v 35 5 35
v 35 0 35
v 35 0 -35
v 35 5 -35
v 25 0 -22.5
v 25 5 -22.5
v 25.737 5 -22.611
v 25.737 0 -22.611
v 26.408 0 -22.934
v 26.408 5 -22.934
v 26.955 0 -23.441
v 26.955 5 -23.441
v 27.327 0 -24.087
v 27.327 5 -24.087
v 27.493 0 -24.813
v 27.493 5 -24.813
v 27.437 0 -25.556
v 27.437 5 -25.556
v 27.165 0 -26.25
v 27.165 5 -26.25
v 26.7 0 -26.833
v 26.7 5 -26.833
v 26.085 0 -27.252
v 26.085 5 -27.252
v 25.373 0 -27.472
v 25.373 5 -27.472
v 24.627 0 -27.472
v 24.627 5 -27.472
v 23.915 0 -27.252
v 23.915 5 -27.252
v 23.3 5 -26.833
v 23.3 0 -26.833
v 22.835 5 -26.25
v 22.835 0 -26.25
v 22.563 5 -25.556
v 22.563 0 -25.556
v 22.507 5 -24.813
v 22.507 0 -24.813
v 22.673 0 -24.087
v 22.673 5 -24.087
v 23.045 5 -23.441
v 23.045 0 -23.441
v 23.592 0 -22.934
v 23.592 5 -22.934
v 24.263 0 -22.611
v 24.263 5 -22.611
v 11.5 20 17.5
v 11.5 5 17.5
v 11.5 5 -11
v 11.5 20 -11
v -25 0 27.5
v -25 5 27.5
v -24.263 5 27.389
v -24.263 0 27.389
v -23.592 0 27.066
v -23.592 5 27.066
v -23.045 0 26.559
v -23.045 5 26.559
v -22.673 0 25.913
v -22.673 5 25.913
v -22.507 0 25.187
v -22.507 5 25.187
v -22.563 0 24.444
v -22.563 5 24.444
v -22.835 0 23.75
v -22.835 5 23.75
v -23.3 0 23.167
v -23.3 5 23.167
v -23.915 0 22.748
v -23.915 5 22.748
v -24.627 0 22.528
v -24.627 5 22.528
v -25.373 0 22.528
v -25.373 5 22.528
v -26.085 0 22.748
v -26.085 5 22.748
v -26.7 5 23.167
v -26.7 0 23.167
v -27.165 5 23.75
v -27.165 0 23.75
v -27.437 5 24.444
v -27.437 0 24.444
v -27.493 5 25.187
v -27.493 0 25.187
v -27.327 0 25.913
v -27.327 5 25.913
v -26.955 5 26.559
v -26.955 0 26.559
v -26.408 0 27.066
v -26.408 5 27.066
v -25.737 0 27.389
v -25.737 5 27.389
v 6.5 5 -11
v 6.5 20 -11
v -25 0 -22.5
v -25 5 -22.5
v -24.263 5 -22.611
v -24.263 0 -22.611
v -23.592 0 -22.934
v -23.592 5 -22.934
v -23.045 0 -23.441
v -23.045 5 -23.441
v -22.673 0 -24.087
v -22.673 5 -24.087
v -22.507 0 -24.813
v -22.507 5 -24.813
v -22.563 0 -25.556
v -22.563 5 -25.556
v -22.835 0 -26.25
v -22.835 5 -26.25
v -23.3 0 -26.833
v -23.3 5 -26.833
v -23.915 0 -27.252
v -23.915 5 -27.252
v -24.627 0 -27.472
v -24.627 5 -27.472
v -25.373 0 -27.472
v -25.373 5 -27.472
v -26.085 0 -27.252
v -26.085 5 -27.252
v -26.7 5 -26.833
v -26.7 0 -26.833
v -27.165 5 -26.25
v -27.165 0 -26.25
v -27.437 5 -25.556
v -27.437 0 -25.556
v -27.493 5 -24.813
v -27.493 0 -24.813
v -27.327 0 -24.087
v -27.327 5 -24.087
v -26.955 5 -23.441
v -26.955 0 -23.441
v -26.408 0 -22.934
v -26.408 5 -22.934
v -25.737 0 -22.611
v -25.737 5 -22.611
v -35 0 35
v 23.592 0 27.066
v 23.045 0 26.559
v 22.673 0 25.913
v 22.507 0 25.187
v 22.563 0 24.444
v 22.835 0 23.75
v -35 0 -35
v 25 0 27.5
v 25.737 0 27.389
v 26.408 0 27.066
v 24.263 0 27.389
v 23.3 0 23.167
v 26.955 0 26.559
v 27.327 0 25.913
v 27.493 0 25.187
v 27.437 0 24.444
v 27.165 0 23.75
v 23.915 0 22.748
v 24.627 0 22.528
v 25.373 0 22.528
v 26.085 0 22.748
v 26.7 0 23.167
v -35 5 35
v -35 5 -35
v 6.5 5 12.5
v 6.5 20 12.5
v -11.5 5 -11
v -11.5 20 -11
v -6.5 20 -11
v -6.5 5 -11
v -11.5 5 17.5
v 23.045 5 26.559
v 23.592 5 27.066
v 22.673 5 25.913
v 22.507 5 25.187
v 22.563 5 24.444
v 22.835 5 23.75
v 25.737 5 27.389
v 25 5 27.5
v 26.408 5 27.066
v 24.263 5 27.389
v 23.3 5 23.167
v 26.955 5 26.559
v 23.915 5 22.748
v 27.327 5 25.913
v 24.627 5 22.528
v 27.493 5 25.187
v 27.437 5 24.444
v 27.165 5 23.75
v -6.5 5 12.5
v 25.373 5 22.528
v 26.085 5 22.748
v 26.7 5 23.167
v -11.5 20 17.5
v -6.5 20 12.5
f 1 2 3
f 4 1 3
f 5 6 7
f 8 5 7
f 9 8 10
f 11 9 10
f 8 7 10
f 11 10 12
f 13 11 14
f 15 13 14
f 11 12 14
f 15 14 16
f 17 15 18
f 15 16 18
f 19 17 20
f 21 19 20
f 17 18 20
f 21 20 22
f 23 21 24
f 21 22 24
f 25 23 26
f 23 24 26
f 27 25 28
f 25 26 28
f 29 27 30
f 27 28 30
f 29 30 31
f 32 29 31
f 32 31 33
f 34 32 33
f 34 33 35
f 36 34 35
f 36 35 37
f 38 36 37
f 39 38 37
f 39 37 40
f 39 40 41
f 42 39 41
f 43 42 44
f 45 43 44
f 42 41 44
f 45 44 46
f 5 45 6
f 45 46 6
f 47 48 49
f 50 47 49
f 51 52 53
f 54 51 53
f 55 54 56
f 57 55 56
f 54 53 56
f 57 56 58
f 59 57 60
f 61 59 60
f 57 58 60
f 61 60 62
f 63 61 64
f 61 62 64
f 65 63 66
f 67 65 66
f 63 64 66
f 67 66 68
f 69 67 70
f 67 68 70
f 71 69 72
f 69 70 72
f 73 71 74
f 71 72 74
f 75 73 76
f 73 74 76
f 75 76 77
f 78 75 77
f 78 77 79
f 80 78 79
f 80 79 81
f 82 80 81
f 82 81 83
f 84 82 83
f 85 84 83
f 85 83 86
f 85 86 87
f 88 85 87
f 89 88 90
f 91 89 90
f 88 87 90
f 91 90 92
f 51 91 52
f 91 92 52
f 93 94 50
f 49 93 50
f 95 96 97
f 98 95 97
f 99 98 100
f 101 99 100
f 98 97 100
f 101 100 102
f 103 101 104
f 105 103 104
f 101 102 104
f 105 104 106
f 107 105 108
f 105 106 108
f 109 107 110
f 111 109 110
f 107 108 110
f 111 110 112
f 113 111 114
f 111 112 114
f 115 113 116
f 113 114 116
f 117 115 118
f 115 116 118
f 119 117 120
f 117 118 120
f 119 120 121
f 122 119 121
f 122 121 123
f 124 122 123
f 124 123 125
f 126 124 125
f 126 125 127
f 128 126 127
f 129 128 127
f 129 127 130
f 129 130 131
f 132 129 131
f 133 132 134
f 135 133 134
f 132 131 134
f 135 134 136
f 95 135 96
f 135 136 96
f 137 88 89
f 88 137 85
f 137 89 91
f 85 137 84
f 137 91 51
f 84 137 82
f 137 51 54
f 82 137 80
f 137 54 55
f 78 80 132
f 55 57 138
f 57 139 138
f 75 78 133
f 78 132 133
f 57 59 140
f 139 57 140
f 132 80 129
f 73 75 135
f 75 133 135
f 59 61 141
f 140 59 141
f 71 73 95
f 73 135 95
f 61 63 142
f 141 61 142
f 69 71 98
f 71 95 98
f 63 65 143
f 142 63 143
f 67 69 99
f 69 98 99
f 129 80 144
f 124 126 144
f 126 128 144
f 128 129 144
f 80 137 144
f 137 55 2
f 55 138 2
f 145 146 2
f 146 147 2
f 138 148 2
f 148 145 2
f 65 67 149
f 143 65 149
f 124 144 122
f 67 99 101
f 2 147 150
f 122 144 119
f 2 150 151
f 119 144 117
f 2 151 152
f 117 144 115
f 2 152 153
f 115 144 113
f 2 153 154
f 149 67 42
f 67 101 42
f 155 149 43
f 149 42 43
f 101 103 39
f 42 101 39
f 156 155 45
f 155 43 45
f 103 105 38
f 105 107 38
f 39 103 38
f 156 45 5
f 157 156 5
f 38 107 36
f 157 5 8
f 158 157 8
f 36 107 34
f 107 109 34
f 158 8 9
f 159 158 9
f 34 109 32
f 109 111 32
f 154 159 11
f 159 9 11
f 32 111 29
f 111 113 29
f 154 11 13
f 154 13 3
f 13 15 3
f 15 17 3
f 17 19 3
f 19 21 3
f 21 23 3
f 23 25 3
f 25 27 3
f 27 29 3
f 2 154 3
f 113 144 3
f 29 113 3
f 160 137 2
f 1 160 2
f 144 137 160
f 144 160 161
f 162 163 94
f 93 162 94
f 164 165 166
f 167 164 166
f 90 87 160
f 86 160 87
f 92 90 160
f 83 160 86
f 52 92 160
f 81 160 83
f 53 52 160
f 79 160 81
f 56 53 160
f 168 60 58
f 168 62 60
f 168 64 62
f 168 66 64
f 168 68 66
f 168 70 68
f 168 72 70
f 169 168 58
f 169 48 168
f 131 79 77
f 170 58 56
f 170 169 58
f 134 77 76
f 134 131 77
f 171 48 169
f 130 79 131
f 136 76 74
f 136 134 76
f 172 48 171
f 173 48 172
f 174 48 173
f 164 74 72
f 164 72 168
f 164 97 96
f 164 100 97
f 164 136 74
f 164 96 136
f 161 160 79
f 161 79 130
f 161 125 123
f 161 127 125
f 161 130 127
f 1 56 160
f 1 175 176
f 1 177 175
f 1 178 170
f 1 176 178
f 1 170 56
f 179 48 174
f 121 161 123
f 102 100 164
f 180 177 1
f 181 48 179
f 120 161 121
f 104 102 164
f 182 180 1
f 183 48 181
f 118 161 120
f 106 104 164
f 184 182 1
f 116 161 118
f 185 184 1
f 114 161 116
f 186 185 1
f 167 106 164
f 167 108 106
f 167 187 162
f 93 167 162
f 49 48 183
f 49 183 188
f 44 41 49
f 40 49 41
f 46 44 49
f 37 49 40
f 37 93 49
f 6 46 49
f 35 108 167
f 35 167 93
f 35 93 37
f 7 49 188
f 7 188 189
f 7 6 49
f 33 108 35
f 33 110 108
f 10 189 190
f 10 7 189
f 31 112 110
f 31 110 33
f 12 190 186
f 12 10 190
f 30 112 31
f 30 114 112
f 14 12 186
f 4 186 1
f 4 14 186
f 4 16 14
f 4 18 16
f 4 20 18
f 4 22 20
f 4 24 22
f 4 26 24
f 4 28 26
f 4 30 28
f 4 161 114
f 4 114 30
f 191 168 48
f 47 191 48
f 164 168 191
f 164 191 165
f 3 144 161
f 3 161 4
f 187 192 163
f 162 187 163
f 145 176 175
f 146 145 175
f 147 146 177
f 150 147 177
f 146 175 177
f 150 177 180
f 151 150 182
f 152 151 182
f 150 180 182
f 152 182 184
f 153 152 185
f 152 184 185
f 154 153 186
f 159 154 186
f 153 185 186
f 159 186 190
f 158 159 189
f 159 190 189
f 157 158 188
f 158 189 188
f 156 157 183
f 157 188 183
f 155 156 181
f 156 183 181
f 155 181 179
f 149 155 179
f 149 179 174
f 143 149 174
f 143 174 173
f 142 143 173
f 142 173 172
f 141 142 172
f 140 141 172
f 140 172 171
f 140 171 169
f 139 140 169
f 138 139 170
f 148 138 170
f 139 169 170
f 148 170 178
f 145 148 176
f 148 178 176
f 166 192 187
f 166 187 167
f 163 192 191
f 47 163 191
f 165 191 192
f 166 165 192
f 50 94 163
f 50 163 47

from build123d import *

# Parameters (mm, degrees)
SKETCH1_W           = 70
SKETCH1_H           = 70
BOSS_EXTRUDE1_DEPTH = 5
SKETCH2_R           = 2.5
CUT_EXTRUDE1_DEPTH  = 5
SKETCH3_R           = 2.5
CUT_EXTRUDE2_DEPTH  = 5
SKETCH4_R           = 2.5
CUT_EXTRUDE3_DEPTH  = 5
SKETCH5_R           = 2.5
CUT_EXTRUDE4_DEPTH  = 5
SKETCH6_W           = 23
SKETCH6_H           = 35
BOSS_EXTRUDE2_DEPTH = 15
SKETCH7_W           = 13
SKETCH7_H           = 30
CUT_EXTRUDE5_DEPTH  = 15
SKETCH8_W           = 5
SKETCH8_H           = 6.5
CUT_EXTRUDE6_DEPTH  = 15
SKETCH9_W           = 5
SKETCH9_H           = 6.5
CUT_EXTRUDE7_DEPTH  = 15


with BuildPart() as part:
    # Sketch1 → Boss-Extrude1 (new body)
    with BuildSketch(Plane(origin=(0, 0, 0), x_dir=(1, 0, 0), z_dir=(0, 1, 0))):
        Rectangle(SKETCH1_W, SKETCH1_H)
    extrude(amount=BOSS_EXTRUDE1_DEPTH)

    # Sketch2 → Cut-Extrude1 (cut)
    with BuildSketch(Plane(origin=(0, 5, 0), x_dir=(1, 0, 0), z_dir=(0, 1, 0))):
        with Locations(Location((-25, 25, 0), (0, 0, 270))):
            Circle(SKETCH2_R)
    extrude(amount=-CUT_EXTRUDE1_DEPTH, mode=Mode.SUBTRACT)

    # Sketch3 → Cut-Extrude2 (cut)
    with BuildSketch(Plane(origin=(0, 5, 0), x_dir=(1, 0, 0), z_dir=(0, 1, 0))):
        with Locations(Location((25, 25, 0), (0, 0, 270))):
            Circle(SKETCH3_R)
    extrude(amount=-CUT_EXTRUDE2_DEPTH, mode=Mode.SUBTRACT)

    # Sketch4 → Cut-Extrude3 (cut)
    with BuildSketch(Plane(origin=(0, 5, 0), x_dir=(1, 0, 0), z_dir=(0, 1, 0))):
        with Locations(Location((-25, -25, 0), (0, 0, 270))):
            Circle(SKETCH4_R)
    extrude(amount=-CUT_EXTRUDE3_DEPTH, mode=Mode.SUBTRACT)

    # Sketch5 → Cut-Extrude4 (cut)
    with BuildSketch(Plane(origin=(0, 5, 0), x_dir=(1, 0, 0), z_dir=(0, 1, 0))):
        with Locations(Location((25, -25, 0), (0, 0, 270))):
            Circle(SKETCH5_R)
    extrude(amount=-CUT_EXTRUDE4_DEPTH, mode=Mode.SUBTRACT)

    # Sketch6 → Boss-Extrude2 (add)
    with BuildSketch(Plane(origin=(0, 5, 0), x_dir=(1, 0, 0), z_dir=(0, 1, 0))):
        Rectangle(SKETCH6_W, SKETCH6_H)
    extrude(amount=BOSS_EXTRUDE2_DEPTH)

    # Sketch7 → Cut-Extrude5 (cut)
    with BuildSketch(Plane(origin=(0, 20, 0), x_dir=(1, 0, 0), z_dir=(0, 1, 0))):
        with Locations((0, 2.5)):
            Rectangle(SKETCH7_W, SKETCH7_H)
    extrude(amount=-CUT_EXTRUDE5_DEPTH, mode=Mode.SUBTRACT)

    # Sketch8 → Cut-Extrude6 (cut)
    with BuildSketch(Plane(origin=(0, 20, 0), x_dir=(1, 0, 0), z_dir=(0, 1, 0))):
        with Locations((-9, 14.25)):
            Rectangle(SKETCH8_W, SKETCH8_H)
    extrude(amount=-CUT_EXTRUDE6_DEPTH, mode=Mode.SUBTRACT)

    # Sketch9 → Cut-Extrude7 (cut)
    with BuildSketch(Plane(origin=(0, 20, 0), x_dir=(1, 0, 0), z_dir=(0, 1, 0))):
        with Locations((9, 14.25)):
            Rectangle(SKETCH9_W, SKETCH9_H)
    extrude(amount=-CUT_EXTRUDE7_DEPTH, mode=Mode.SUBTRACT)


solid = part.part
